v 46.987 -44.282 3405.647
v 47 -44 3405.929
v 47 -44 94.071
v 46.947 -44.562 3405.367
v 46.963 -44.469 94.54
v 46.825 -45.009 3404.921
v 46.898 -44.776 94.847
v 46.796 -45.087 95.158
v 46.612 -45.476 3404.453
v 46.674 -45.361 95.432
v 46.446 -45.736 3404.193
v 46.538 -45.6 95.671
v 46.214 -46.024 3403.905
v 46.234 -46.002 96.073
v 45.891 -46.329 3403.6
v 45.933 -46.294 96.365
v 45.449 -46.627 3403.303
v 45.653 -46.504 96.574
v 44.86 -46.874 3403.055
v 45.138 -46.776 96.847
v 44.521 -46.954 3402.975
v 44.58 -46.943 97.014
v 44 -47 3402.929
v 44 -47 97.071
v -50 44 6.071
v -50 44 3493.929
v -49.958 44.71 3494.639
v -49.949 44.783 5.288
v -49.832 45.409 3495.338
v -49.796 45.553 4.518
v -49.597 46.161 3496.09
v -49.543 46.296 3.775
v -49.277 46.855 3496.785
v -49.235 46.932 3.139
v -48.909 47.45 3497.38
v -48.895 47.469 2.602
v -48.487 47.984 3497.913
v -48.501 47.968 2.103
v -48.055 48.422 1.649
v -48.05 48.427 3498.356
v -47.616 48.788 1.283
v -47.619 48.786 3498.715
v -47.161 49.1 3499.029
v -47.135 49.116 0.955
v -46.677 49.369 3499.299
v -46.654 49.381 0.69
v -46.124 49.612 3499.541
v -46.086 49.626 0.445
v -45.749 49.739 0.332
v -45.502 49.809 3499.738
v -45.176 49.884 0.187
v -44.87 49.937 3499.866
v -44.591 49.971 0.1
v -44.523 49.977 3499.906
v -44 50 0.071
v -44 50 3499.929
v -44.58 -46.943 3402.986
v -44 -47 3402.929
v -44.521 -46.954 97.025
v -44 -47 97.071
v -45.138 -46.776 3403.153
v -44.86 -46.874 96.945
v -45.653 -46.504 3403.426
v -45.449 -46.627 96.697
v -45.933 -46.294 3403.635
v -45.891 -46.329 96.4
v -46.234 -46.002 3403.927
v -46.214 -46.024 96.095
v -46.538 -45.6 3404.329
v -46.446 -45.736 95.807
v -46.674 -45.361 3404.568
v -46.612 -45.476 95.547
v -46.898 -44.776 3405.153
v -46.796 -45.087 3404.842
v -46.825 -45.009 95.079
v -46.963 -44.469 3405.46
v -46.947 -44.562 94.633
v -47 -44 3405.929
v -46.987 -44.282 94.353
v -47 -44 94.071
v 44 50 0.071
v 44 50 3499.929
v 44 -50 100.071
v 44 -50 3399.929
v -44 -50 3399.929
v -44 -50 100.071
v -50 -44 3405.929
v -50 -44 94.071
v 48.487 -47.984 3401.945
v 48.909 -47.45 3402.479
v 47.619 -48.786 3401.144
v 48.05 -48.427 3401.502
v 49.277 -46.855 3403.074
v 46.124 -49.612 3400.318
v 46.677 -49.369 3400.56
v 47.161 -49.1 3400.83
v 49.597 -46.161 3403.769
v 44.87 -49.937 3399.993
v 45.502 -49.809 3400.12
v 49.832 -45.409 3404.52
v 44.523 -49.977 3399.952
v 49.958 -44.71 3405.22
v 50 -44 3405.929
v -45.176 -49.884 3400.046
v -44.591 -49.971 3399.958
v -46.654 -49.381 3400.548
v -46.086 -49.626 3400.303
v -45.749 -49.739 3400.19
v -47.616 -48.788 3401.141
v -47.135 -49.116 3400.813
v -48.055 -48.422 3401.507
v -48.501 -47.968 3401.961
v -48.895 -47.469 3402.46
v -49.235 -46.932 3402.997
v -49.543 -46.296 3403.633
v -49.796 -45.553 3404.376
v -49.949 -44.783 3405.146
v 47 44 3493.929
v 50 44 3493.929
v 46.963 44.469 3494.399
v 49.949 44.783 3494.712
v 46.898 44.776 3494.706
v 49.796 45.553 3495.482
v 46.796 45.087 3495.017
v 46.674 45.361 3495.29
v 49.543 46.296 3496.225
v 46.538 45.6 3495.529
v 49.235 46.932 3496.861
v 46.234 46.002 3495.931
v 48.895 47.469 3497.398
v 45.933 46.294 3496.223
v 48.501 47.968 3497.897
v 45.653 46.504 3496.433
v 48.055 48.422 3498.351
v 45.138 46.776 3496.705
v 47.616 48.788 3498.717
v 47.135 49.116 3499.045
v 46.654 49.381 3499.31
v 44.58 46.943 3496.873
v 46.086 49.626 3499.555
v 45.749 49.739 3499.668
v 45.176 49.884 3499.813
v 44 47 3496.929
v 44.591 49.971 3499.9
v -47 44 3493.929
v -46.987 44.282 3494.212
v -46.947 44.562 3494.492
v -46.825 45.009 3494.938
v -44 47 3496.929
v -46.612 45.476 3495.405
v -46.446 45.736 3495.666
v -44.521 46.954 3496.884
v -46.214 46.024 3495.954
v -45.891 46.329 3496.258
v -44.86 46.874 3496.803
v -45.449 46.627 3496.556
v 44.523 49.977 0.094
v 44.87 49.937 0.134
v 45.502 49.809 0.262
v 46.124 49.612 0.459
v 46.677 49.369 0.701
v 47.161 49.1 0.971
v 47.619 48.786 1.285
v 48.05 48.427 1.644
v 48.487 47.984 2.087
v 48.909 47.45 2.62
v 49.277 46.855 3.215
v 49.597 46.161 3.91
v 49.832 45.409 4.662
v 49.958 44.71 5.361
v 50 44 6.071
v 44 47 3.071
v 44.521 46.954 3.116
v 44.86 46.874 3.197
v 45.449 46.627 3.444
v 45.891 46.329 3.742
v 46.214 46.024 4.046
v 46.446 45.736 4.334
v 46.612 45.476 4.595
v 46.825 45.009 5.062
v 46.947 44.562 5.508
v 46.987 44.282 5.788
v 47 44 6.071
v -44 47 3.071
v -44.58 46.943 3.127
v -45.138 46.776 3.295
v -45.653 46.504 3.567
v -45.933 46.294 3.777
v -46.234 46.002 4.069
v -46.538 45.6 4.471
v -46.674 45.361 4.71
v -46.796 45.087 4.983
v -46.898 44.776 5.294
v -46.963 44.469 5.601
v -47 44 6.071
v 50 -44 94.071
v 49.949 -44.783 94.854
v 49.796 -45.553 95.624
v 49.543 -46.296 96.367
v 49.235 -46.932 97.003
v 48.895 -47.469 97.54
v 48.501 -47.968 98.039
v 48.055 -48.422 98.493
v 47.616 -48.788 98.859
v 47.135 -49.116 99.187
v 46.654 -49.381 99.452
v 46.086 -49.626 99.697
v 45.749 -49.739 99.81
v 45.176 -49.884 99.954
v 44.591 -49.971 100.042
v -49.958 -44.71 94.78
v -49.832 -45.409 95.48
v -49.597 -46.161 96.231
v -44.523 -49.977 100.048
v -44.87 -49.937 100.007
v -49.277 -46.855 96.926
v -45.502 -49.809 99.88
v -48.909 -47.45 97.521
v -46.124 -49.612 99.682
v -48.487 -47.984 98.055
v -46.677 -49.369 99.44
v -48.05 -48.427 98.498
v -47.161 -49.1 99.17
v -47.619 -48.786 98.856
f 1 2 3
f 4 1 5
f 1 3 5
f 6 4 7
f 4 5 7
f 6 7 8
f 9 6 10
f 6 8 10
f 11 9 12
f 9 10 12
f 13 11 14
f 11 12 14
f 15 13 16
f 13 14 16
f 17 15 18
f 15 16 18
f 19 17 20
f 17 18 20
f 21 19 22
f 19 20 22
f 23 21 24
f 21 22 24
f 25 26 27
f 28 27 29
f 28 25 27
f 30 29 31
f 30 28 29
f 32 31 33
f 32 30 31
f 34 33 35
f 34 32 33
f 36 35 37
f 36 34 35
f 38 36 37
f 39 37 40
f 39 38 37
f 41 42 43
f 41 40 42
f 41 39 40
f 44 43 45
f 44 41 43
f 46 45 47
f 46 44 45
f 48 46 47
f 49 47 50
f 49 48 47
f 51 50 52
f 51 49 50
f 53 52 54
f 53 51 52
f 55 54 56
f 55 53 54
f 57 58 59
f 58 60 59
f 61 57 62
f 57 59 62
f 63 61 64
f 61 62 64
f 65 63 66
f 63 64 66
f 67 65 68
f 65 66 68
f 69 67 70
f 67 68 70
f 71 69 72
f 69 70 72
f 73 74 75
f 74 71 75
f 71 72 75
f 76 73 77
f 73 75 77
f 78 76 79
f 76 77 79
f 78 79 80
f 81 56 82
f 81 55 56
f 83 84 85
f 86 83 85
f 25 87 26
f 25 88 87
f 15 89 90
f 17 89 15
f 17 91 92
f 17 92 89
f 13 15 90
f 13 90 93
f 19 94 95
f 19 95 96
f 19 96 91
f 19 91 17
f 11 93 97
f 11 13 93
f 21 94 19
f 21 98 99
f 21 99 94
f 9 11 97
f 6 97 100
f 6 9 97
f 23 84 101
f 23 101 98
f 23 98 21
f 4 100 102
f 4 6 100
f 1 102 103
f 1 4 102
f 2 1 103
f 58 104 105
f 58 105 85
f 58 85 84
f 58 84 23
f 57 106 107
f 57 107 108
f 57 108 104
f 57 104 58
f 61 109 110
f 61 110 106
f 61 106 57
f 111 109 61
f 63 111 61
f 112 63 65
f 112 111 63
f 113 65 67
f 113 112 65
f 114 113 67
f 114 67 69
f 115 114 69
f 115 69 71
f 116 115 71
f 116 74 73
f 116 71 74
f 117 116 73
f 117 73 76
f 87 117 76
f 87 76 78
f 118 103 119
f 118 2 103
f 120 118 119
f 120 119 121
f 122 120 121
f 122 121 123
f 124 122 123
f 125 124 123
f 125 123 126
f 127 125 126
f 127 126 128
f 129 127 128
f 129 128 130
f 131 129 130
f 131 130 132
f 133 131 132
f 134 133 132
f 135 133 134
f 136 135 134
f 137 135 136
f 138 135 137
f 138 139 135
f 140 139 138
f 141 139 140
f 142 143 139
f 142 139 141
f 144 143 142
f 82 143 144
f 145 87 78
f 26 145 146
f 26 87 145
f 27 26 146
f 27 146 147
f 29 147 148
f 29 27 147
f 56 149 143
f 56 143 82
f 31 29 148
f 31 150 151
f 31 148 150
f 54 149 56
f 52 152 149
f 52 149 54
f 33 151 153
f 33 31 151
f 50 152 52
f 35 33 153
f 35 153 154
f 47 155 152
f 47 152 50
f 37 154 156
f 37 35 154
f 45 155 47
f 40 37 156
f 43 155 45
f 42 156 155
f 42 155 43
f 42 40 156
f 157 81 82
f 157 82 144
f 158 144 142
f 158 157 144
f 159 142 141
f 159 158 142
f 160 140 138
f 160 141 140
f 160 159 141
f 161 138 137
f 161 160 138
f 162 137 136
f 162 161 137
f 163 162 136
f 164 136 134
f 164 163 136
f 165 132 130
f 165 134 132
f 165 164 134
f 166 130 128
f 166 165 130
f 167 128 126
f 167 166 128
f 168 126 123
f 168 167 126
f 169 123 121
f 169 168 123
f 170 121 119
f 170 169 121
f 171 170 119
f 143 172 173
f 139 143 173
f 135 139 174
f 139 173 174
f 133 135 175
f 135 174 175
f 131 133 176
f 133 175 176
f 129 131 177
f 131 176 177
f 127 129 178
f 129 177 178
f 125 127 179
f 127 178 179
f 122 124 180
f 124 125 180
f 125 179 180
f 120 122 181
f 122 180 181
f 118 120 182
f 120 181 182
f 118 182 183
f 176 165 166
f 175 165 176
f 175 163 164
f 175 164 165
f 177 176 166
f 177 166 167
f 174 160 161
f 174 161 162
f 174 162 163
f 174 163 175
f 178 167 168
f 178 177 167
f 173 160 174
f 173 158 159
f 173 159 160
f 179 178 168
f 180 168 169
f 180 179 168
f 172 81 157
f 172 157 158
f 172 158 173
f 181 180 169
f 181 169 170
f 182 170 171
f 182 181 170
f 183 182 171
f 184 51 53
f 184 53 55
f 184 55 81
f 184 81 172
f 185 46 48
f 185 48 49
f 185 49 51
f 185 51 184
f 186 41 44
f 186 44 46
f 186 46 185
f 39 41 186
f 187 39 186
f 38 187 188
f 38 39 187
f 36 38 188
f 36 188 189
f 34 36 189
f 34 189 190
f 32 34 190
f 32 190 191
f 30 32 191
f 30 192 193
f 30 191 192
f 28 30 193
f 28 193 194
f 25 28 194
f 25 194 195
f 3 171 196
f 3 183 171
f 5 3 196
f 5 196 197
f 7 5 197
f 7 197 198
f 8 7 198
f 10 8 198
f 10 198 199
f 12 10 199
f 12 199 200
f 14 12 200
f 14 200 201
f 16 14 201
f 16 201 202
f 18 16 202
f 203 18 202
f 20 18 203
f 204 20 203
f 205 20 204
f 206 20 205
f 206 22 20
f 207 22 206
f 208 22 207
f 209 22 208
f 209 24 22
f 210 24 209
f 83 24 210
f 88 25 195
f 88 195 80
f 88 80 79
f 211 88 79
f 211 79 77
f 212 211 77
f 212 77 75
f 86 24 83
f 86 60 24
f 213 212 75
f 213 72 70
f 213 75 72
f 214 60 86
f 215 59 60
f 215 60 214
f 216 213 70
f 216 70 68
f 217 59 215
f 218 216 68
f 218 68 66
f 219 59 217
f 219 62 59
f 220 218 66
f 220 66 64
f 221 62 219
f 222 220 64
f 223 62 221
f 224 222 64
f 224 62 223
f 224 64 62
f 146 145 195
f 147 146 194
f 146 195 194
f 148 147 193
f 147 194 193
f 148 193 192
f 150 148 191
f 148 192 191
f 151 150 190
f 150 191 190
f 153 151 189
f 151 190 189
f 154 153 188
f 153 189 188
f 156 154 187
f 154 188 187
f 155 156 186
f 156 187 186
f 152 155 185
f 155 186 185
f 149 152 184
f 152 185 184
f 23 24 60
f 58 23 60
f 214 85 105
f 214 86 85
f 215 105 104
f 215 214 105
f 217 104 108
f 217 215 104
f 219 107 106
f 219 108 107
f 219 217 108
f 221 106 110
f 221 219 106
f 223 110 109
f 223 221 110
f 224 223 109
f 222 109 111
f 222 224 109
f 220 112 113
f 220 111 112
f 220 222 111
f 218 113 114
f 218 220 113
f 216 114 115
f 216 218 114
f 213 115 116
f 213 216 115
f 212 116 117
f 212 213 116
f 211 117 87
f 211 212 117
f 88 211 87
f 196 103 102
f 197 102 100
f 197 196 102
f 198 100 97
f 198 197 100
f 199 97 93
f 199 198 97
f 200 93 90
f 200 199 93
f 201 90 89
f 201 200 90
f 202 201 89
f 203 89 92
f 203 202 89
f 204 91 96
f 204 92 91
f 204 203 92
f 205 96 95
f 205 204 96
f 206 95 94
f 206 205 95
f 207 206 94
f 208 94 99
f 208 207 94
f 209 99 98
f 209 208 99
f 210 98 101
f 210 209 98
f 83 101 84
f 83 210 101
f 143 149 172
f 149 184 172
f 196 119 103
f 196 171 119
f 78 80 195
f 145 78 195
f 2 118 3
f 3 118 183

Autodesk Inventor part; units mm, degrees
ref_plane "Start Plane" through (0, 0, 0.0707) normal (0, 0, 1) x (1, 0, 0)
ref_plane "End Plane" through (0, 0, 3499.9293) normal (0, 0, 1) x (1, 0, 0)
sketch "Sketch" plane through (0, 0, 0) normal (0, 0, 1) x (1, 0, 0)
  line L0 (-50, -44) -> (-50, 44)
  line L1 (-44, 50) -> (44, 50)
  line L2 (50, 44) -> (50, -44)
  line L3 (44, -50) -> (-44, -50)
  arc A0 (-50, -44) -> (-44, -50) centre (-44, -44) ccw
  arc A1 (50, 44) -> (44, 50) centre (44, 44) ccw
  arc A2 (-44, 50) -> (-50, 44) centre (-44, 44) ccw
  arc A3 (44, -50) -> (50, -44) centre (44, -44) ccw
  arc A4 (-44, 47) -> (-47, 44) centre (-44, 44) ccw
  line L4 (-44, 47) -> (44, 47)
  arc A5 (47, 44) -> (44, 47) centre (44, 44) ccw
  line L5 (47, 44) -> (47, -44)
  arc A6 (44, -47) -> (47, -44) centre (44, -44) ccw
  line L6 (44, -47) -> (-44, -47)
  arc A7 (-47, -44) -> (-44, -47) centre (-44, -44) ccw
  line L7 (-47, -44) -> (-47, 44)
  line L8 (0, 71.7397) -> (0, -71.7397) construction
  line L9 (-71.7397, 0) -> (71.7397, 0) construction
  dimension "d7" = 6
  dimension "d9" = 100
  dimension "d11" = 100
  dimension "d12" = 3
  dimension "d15" = 50
  dimension "d16" = 50
extrude "Body" add sketch "Sketch" along normal up to surface (3499.8586 mm away) from surface at 0.0707
sketch "Sketch3" plane through (0, 0, 0) normal (0, 0, 1) x (1, 0, 0)
  line L0 (0, 0) -> (10, 0)
ref_plane "Work Plane3" through (0, 0, 0) normal (0, -1, 0) x (1, 0, 0)
ref_plane "Work Plane4" through (0, 50.0354, 3499.9646) normal (0, -0.7071, 0.7071) x (1, 0, 0)
split "Split1" plane through (0, 50.0354, 3499.9646) removes the side toward (0, -0.7071, 0.7071)
ref_plane "Work Plane5" through (0, 50.0354, 0.0354) normal (0, -0.7071, -0.7071) x (1, 0, 0)
split "Split2" plane through (0, 50.0354, 0.0354) removes the side toward (0, -0.7071, -0.7071)
sketch "Sketch4" plane through (0, 0, 0) normal (0, -1, 0) x (1, 0, 0)
  line L0 (-2, 0.0707) -> (12, 0.0707) projected
  line L1 (-2, 3499.9293) -> (12, 3499.9293) projected
  dimension "d18" = 3499.8586
equation "\"d7\" = G_IR"
equation "\"d9\" = G_W"
equation "\"d11\" = G_H"
equation "\"d12\" = G_T"
equation "\"d15\" = 0.5 * d9"
equation "\"d16\" = 0.5 * d11"
equation "\"d3\" = G_L"
equation "\"G_W\" = 100"
equation "\"G_H\" = 100"
equation "\"G_T\" = 3"
equation "\"G_IR\" = 6"
equation "\"G_L\" = d18"
equation "\"G_OFFSET_START\" = -0.07071"
equation "\"G_OFFSET_END\" = -0.07071"
equation "\"d13\" = -G_OFFSET_START"
equation "\"d14\" = G_OFFSET_END + B_L"
equation "\"B_L\" = 3500"
properties part number "ISO 10799-2 - 100x100x3 - 3499.86" material "Steel"
